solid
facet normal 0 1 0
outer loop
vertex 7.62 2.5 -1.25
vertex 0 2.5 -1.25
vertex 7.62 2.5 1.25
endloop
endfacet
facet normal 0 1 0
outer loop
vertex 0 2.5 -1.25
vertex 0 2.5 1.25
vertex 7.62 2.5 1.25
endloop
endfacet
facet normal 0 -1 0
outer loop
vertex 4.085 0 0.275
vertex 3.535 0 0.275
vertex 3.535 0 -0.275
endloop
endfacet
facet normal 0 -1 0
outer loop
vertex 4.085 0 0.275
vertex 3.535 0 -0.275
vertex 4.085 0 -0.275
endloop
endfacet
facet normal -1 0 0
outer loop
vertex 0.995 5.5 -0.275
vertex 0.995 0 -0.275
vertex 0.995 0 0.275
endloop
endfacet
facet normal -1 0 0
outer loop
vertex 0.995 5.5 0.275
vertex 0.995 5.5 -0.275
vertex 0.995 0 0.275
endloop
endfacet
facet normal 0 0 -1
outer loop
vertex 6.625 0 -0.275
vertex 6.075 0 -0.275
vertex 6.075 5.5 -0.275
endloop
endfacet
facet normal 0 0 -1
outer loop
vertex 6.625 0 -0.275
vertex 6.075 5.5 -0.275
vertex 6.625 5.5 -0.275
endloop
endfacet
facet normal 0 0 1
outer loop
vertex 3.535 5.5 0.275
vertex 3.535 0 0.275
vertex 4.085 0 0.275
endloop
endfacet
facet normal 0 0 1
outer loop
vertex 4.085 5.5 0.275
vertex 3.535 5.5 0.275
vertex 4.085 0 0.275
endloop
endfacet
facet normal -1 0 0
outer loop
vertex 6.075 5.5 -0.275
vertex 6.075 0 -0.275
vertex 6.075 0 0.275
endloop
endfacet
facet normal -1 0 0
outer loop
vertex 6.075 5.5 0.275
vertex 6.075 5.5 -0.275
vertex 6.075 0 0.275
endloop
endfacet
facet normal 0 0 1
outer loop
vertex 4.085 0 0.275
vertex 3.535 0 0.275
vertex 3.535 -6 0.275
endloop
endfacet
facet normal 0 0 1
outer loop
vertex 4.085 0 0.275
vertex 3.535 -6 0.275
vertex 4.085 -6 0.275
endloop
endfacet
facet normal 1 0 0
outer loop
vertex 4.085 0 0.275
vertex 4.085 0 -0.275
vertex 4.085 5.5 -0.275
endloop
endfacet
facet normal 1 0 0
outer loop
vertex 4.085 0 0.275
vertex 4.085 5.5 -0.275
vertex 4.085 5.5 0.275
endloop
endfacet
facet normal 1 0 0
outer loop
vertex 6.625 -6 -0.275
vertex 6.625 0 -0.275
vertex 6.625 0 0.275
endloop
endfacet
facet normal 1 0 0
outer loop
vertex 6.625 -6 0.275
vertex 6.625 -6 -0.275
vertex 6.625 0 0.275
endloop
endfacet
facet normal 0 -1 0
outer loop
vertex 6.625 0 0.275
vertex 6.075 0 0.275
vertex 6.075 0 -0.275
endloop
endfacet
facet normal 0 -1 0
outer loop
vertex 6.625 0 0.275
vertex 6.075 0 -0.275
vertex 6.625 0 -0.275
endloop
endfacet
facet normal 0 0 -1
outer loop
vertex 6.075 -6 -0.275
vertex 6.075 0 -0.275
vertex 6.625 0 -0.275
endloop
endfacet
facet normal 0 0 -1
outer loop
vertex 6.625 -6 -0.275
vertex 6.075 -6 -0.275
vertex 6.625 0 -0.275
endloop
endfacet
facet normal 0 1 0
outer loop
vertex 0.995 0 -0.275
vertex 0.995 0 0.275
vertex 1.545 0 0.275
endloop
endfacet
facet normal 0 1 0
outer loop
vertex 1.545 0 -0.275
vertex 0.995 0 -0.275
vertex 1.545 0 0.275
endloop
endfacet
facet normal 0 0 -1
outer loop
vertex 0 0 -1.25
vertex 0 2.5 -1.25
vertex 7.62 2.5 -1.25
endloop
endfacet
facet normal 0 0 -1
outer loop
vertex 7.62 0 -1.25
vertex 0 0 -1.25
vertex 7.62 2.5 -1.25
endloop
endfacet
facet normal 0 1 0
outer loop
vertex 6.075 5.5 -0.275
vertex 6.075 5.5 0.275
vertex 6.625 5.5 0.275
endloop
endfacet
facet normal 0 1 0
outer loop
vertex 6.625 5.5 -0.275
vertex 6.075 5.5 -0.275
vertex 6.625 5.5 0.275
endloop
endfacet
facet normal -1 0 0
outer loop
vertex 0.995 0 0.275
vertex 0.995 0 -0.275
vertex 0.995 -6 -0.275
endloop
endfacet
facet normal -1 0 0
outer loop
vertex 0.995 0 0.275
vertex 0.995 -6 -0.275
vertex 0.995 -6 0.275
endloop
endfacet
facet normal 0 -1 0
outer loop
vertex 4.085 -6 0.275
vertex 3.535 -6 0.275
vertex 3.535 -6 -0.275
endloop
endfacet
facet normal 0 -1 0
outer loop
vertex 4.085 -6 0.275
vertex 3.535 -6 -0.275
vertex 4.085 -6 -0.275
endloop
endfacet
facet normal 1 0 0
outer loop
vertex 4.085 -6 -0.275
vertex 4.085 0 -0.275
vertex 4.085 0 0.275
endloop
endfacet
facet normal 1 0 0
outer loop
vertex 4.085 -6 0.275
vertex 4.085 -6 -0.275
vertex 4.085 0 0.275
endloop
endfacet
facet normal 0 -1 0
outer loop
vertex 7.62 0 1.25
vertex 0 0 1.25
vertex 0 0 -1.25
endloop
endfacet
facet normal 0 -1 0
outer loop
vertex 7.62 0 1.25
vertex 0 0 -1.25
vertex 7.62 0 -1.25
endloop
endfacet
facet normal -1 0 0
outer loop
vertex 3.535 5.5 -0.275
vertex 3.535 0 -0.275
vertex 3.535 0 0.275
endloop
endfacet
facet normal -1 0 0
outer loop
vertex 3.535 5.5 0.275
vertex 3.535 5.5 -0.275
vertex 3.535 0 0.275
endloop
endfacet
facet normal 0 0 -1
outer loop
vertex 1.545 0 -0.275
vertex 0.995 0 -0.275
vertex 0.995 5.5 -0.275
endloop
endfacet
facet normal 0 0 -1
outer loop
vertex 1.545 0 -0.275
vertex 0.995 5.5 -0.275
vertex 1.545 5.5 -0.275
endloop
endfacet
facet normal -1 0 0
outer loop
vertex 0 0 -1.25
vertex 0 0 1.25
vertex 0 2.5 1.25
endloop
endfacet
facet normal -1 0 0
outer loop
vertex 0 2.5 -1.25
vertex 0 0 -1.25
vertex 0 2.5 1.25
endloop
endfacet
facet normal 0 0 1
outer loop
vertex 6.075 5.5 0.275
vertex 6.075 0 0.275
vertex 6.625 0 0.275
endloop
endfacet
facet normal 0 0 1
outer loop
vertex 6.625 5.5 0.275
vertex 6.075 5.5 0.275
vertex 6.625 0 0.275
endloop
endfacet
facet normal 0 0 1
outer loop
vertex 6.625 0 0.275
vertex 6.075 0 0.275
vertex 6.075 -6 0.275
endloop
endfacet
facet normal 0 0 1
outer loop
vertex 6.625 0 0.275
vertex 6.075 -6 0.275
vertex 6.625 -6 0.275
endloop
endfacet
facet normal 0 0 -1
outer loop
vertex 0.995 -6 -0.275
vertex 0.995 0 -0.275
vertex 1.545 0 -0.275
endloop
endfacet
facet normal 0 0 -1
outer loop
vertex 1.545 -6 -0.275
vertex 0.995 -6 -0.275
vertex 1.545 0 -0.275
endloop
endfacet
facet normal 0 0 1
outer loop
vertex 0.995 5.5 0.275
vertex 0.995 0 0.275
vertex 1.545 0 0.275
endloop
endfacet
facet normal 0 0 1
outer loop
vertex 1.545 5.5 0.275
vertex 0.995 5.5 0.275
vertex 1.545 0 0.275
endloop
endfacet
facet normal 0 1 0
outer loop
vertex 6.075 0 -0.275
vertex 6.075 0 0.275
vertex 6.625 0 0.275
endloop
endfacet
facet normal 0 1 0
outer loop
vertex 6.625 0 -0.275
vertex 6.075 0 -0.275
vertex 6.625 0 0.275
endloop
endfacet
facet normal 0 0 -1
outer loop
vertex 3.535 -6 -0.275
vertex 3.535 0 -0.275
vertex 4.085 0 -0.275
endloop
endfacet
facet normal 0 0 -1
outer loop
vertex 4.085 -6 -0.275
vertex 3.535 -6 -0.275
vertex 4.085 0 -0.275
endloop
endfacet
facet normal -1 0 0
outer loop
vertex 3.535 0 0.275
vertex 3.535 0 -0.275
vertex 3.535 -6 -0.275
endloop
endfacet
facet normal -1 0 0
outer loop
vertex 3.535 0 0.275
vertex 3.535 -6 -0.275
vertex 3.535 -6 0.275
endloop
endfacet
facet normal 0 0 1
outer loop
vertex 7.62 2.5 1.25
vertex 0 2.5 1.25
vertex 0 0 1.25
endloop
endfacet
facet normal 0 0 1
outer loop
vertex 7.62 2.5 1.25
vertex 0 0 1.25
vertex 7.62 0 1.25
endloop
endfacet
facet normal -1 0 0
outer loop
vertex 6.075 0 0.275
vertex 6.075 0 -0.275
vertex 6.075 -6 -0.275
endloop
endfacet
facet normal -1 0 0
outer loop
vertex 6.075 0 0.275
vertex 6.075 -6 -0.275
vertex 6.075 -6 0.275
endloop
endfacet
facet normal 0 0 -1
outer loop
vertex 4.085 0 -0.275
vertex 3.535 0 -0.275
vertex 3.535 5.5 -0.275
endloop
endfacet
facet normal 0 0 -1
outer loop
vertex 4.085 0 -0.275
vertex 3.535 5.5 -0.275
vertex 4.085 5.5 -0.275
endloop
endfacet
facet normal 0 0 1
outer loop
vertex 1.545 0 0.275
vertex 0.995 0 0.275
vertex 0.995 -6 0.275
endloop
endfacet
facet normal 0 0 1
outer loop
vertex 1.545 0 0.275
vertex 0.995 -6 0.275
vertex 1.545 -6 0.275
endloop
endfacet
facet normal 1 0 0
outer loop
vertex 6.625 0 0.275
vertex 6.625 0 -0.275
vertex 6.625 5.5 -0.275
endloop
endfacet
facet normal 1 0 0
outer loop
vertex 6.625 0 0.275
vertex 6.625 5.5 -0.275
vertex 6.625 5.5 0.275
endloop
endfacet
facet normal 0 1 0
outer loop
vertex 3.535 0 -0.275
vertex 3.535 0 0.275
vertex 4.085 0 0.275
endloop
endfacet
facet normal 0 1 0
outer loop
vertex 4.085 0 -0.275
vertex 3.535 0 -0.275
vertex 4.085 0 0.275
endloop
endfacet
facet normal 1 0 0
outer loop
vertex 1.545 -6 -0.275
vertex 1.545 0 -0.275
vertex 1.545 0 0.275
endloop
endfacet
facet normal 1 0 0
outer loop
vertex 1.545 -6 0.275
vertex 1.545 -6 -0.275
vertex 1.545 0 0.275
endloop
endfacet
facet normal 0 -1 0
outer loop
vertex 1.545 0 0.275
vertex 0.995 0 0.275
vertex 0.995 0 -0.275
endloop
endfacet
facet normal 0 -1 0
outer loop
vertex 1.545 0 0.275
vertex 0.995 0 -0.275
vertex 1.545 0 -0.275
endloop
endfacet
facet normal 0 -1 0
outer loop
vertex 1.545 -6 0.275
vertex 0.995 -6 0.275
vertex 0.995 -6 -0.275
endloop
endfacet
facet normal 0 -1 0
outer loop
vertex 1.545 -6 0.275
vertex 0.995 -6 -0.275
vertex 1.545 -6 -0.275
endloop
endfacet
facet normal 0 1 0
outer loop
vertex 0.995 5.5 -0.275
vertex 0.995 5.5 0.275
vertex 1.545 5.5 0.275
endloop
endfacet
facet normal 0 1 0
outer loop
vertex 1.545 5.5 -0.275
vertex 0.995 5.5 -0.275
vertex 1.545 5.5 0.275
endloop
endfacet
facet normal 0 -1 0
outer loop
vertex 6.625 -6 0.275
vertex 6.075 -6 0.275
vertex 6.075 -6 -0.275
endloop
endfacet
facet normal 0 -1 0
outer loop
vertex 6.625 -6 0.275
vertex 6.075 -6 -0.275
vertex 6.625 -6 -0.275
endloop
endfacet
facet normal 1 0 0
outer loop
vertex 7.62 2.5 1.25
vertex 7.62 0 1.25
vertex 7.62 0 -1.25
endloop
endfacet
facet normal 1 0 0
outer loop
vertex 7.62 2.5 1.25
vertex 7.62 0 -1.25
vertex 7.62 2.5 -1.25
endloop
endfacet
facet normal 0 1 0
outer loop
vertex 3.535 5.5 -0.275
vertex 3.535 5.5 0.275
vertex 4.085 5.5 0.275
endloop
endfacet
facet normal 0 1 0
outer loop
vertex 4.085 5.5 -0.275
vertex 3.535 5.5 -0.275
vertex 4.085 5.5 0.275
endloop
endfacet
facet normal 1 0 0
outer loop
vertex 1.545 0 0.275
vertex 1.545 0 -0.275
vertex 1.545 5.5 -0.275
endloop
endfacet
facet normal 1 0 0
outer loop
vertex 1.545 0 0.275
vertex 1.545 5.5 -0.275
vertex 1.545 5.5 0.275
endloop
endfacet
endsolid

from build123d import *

# Parameters (mm, degrees)
SKETCH1_W             = 7.62
SKETCH1_H             = 2.5
BOSS_EXTRUDE1_DEPTH   = 1.25
SKETCH2_W             = 0.55
SKETCH2_H             = 0.55
BOSS_EXTRUDE2_DEPTH   = 6
BOSS_EXTRUDE2_2_DEPTH = 6
BOSS_EXTRUDE2_3_DEPTH = 6
SKETCH2_2_W           = 0.55
SKETCH2_2_H           = 0.55
BOSS_EXTRUDE3_DEPTH   = 5.5
BOSS_EXTRUDE3_2_DEPTH = 5.5
BOSS_EXTRUDE3_3_DEPTH = 5.5


with BuildPart() as part:
    # Sketch1 → Boss-Extrude1 (new body, symmetric)
    with BuildSketch(Plane.XY):
        with Locations((3.81, 1.25)):
            Rectangle(SKETCH1_W, SKETCH1_H)
    extrude(amount=BOSS_EXTRUDE1_DEPTH, both=True)


with BuildPart() as body_2:
    # Sketch2 → Boss-Extrude2 (new body)
    with BuildSketch(Plane.XZ):
        with Locations((3.81, 0)):
            Rectangle(SKETCH2_W, SKETCH2_H)
    extrude(amount=BOSS_EXTRUDE2_DEPTH)


with BuildPart() as body_3:
    # Sketch2 → Boss-Extrude2 2 (new body)
    with BuildSketch(Plane.XZ):
        with Locations((1.27, 0)):
            Rectangle(SKETCH2_W, SKETCH2_H)
    extrude(amount=BOSS_EXTRUDE2_2_DEPTH)


with BuildPart() as body_4:
    # Sketch2 → Boss-Extrude2 3 (new body)
    with BuildSketch(Plane.XZ):
        with Locations((6.35, 0)):
            Rectangle(SKETCH2_W, SKETCH2_H)
    extrude(amount=BOSS_EXTRUDE2_3_DEPTH)


with BuildPart() as body_5:
    # Sketch2_2 → Boss-Extrude3 (new body)
    with BuildSketch(Plane.XZ):
        with Locations((3.81, 0)):
            Rectangle(SKETCH2_2_W, SKETCH2_2_H)
    extrude(amount=-BOSS_EXTRUDE3_DEPTH)


with BuildPart() as body_6:
    # Sketch2_2 → Boss-Extrude3 2 (new body)
    with BuildSketch(Plane.XZ):
        with Locations((1.27, 0)):
            Rectangle(SKETCH2_2_W, SKETCH2_2_H)
    extrude(amount=-BOSS_EXTRUDE3_2_DEPTH)


with BuildPart() as body_7:
    # Sketch2_2 → Boss-Extrude3 3 (new body)
    with BuildSketch(Plane.XZ):
        with Locations((6.35, 0)):
            Rectangle(SKETCH2_2_W, SKETCH2_2_H)
    extrude(amount=-BOSS_EXTRUDE3_3_DEPTH)


solid = Compound([part.part, body_2.part, body_3.part, body_4.part, body_5.part, body_6.part, body_7.part])
